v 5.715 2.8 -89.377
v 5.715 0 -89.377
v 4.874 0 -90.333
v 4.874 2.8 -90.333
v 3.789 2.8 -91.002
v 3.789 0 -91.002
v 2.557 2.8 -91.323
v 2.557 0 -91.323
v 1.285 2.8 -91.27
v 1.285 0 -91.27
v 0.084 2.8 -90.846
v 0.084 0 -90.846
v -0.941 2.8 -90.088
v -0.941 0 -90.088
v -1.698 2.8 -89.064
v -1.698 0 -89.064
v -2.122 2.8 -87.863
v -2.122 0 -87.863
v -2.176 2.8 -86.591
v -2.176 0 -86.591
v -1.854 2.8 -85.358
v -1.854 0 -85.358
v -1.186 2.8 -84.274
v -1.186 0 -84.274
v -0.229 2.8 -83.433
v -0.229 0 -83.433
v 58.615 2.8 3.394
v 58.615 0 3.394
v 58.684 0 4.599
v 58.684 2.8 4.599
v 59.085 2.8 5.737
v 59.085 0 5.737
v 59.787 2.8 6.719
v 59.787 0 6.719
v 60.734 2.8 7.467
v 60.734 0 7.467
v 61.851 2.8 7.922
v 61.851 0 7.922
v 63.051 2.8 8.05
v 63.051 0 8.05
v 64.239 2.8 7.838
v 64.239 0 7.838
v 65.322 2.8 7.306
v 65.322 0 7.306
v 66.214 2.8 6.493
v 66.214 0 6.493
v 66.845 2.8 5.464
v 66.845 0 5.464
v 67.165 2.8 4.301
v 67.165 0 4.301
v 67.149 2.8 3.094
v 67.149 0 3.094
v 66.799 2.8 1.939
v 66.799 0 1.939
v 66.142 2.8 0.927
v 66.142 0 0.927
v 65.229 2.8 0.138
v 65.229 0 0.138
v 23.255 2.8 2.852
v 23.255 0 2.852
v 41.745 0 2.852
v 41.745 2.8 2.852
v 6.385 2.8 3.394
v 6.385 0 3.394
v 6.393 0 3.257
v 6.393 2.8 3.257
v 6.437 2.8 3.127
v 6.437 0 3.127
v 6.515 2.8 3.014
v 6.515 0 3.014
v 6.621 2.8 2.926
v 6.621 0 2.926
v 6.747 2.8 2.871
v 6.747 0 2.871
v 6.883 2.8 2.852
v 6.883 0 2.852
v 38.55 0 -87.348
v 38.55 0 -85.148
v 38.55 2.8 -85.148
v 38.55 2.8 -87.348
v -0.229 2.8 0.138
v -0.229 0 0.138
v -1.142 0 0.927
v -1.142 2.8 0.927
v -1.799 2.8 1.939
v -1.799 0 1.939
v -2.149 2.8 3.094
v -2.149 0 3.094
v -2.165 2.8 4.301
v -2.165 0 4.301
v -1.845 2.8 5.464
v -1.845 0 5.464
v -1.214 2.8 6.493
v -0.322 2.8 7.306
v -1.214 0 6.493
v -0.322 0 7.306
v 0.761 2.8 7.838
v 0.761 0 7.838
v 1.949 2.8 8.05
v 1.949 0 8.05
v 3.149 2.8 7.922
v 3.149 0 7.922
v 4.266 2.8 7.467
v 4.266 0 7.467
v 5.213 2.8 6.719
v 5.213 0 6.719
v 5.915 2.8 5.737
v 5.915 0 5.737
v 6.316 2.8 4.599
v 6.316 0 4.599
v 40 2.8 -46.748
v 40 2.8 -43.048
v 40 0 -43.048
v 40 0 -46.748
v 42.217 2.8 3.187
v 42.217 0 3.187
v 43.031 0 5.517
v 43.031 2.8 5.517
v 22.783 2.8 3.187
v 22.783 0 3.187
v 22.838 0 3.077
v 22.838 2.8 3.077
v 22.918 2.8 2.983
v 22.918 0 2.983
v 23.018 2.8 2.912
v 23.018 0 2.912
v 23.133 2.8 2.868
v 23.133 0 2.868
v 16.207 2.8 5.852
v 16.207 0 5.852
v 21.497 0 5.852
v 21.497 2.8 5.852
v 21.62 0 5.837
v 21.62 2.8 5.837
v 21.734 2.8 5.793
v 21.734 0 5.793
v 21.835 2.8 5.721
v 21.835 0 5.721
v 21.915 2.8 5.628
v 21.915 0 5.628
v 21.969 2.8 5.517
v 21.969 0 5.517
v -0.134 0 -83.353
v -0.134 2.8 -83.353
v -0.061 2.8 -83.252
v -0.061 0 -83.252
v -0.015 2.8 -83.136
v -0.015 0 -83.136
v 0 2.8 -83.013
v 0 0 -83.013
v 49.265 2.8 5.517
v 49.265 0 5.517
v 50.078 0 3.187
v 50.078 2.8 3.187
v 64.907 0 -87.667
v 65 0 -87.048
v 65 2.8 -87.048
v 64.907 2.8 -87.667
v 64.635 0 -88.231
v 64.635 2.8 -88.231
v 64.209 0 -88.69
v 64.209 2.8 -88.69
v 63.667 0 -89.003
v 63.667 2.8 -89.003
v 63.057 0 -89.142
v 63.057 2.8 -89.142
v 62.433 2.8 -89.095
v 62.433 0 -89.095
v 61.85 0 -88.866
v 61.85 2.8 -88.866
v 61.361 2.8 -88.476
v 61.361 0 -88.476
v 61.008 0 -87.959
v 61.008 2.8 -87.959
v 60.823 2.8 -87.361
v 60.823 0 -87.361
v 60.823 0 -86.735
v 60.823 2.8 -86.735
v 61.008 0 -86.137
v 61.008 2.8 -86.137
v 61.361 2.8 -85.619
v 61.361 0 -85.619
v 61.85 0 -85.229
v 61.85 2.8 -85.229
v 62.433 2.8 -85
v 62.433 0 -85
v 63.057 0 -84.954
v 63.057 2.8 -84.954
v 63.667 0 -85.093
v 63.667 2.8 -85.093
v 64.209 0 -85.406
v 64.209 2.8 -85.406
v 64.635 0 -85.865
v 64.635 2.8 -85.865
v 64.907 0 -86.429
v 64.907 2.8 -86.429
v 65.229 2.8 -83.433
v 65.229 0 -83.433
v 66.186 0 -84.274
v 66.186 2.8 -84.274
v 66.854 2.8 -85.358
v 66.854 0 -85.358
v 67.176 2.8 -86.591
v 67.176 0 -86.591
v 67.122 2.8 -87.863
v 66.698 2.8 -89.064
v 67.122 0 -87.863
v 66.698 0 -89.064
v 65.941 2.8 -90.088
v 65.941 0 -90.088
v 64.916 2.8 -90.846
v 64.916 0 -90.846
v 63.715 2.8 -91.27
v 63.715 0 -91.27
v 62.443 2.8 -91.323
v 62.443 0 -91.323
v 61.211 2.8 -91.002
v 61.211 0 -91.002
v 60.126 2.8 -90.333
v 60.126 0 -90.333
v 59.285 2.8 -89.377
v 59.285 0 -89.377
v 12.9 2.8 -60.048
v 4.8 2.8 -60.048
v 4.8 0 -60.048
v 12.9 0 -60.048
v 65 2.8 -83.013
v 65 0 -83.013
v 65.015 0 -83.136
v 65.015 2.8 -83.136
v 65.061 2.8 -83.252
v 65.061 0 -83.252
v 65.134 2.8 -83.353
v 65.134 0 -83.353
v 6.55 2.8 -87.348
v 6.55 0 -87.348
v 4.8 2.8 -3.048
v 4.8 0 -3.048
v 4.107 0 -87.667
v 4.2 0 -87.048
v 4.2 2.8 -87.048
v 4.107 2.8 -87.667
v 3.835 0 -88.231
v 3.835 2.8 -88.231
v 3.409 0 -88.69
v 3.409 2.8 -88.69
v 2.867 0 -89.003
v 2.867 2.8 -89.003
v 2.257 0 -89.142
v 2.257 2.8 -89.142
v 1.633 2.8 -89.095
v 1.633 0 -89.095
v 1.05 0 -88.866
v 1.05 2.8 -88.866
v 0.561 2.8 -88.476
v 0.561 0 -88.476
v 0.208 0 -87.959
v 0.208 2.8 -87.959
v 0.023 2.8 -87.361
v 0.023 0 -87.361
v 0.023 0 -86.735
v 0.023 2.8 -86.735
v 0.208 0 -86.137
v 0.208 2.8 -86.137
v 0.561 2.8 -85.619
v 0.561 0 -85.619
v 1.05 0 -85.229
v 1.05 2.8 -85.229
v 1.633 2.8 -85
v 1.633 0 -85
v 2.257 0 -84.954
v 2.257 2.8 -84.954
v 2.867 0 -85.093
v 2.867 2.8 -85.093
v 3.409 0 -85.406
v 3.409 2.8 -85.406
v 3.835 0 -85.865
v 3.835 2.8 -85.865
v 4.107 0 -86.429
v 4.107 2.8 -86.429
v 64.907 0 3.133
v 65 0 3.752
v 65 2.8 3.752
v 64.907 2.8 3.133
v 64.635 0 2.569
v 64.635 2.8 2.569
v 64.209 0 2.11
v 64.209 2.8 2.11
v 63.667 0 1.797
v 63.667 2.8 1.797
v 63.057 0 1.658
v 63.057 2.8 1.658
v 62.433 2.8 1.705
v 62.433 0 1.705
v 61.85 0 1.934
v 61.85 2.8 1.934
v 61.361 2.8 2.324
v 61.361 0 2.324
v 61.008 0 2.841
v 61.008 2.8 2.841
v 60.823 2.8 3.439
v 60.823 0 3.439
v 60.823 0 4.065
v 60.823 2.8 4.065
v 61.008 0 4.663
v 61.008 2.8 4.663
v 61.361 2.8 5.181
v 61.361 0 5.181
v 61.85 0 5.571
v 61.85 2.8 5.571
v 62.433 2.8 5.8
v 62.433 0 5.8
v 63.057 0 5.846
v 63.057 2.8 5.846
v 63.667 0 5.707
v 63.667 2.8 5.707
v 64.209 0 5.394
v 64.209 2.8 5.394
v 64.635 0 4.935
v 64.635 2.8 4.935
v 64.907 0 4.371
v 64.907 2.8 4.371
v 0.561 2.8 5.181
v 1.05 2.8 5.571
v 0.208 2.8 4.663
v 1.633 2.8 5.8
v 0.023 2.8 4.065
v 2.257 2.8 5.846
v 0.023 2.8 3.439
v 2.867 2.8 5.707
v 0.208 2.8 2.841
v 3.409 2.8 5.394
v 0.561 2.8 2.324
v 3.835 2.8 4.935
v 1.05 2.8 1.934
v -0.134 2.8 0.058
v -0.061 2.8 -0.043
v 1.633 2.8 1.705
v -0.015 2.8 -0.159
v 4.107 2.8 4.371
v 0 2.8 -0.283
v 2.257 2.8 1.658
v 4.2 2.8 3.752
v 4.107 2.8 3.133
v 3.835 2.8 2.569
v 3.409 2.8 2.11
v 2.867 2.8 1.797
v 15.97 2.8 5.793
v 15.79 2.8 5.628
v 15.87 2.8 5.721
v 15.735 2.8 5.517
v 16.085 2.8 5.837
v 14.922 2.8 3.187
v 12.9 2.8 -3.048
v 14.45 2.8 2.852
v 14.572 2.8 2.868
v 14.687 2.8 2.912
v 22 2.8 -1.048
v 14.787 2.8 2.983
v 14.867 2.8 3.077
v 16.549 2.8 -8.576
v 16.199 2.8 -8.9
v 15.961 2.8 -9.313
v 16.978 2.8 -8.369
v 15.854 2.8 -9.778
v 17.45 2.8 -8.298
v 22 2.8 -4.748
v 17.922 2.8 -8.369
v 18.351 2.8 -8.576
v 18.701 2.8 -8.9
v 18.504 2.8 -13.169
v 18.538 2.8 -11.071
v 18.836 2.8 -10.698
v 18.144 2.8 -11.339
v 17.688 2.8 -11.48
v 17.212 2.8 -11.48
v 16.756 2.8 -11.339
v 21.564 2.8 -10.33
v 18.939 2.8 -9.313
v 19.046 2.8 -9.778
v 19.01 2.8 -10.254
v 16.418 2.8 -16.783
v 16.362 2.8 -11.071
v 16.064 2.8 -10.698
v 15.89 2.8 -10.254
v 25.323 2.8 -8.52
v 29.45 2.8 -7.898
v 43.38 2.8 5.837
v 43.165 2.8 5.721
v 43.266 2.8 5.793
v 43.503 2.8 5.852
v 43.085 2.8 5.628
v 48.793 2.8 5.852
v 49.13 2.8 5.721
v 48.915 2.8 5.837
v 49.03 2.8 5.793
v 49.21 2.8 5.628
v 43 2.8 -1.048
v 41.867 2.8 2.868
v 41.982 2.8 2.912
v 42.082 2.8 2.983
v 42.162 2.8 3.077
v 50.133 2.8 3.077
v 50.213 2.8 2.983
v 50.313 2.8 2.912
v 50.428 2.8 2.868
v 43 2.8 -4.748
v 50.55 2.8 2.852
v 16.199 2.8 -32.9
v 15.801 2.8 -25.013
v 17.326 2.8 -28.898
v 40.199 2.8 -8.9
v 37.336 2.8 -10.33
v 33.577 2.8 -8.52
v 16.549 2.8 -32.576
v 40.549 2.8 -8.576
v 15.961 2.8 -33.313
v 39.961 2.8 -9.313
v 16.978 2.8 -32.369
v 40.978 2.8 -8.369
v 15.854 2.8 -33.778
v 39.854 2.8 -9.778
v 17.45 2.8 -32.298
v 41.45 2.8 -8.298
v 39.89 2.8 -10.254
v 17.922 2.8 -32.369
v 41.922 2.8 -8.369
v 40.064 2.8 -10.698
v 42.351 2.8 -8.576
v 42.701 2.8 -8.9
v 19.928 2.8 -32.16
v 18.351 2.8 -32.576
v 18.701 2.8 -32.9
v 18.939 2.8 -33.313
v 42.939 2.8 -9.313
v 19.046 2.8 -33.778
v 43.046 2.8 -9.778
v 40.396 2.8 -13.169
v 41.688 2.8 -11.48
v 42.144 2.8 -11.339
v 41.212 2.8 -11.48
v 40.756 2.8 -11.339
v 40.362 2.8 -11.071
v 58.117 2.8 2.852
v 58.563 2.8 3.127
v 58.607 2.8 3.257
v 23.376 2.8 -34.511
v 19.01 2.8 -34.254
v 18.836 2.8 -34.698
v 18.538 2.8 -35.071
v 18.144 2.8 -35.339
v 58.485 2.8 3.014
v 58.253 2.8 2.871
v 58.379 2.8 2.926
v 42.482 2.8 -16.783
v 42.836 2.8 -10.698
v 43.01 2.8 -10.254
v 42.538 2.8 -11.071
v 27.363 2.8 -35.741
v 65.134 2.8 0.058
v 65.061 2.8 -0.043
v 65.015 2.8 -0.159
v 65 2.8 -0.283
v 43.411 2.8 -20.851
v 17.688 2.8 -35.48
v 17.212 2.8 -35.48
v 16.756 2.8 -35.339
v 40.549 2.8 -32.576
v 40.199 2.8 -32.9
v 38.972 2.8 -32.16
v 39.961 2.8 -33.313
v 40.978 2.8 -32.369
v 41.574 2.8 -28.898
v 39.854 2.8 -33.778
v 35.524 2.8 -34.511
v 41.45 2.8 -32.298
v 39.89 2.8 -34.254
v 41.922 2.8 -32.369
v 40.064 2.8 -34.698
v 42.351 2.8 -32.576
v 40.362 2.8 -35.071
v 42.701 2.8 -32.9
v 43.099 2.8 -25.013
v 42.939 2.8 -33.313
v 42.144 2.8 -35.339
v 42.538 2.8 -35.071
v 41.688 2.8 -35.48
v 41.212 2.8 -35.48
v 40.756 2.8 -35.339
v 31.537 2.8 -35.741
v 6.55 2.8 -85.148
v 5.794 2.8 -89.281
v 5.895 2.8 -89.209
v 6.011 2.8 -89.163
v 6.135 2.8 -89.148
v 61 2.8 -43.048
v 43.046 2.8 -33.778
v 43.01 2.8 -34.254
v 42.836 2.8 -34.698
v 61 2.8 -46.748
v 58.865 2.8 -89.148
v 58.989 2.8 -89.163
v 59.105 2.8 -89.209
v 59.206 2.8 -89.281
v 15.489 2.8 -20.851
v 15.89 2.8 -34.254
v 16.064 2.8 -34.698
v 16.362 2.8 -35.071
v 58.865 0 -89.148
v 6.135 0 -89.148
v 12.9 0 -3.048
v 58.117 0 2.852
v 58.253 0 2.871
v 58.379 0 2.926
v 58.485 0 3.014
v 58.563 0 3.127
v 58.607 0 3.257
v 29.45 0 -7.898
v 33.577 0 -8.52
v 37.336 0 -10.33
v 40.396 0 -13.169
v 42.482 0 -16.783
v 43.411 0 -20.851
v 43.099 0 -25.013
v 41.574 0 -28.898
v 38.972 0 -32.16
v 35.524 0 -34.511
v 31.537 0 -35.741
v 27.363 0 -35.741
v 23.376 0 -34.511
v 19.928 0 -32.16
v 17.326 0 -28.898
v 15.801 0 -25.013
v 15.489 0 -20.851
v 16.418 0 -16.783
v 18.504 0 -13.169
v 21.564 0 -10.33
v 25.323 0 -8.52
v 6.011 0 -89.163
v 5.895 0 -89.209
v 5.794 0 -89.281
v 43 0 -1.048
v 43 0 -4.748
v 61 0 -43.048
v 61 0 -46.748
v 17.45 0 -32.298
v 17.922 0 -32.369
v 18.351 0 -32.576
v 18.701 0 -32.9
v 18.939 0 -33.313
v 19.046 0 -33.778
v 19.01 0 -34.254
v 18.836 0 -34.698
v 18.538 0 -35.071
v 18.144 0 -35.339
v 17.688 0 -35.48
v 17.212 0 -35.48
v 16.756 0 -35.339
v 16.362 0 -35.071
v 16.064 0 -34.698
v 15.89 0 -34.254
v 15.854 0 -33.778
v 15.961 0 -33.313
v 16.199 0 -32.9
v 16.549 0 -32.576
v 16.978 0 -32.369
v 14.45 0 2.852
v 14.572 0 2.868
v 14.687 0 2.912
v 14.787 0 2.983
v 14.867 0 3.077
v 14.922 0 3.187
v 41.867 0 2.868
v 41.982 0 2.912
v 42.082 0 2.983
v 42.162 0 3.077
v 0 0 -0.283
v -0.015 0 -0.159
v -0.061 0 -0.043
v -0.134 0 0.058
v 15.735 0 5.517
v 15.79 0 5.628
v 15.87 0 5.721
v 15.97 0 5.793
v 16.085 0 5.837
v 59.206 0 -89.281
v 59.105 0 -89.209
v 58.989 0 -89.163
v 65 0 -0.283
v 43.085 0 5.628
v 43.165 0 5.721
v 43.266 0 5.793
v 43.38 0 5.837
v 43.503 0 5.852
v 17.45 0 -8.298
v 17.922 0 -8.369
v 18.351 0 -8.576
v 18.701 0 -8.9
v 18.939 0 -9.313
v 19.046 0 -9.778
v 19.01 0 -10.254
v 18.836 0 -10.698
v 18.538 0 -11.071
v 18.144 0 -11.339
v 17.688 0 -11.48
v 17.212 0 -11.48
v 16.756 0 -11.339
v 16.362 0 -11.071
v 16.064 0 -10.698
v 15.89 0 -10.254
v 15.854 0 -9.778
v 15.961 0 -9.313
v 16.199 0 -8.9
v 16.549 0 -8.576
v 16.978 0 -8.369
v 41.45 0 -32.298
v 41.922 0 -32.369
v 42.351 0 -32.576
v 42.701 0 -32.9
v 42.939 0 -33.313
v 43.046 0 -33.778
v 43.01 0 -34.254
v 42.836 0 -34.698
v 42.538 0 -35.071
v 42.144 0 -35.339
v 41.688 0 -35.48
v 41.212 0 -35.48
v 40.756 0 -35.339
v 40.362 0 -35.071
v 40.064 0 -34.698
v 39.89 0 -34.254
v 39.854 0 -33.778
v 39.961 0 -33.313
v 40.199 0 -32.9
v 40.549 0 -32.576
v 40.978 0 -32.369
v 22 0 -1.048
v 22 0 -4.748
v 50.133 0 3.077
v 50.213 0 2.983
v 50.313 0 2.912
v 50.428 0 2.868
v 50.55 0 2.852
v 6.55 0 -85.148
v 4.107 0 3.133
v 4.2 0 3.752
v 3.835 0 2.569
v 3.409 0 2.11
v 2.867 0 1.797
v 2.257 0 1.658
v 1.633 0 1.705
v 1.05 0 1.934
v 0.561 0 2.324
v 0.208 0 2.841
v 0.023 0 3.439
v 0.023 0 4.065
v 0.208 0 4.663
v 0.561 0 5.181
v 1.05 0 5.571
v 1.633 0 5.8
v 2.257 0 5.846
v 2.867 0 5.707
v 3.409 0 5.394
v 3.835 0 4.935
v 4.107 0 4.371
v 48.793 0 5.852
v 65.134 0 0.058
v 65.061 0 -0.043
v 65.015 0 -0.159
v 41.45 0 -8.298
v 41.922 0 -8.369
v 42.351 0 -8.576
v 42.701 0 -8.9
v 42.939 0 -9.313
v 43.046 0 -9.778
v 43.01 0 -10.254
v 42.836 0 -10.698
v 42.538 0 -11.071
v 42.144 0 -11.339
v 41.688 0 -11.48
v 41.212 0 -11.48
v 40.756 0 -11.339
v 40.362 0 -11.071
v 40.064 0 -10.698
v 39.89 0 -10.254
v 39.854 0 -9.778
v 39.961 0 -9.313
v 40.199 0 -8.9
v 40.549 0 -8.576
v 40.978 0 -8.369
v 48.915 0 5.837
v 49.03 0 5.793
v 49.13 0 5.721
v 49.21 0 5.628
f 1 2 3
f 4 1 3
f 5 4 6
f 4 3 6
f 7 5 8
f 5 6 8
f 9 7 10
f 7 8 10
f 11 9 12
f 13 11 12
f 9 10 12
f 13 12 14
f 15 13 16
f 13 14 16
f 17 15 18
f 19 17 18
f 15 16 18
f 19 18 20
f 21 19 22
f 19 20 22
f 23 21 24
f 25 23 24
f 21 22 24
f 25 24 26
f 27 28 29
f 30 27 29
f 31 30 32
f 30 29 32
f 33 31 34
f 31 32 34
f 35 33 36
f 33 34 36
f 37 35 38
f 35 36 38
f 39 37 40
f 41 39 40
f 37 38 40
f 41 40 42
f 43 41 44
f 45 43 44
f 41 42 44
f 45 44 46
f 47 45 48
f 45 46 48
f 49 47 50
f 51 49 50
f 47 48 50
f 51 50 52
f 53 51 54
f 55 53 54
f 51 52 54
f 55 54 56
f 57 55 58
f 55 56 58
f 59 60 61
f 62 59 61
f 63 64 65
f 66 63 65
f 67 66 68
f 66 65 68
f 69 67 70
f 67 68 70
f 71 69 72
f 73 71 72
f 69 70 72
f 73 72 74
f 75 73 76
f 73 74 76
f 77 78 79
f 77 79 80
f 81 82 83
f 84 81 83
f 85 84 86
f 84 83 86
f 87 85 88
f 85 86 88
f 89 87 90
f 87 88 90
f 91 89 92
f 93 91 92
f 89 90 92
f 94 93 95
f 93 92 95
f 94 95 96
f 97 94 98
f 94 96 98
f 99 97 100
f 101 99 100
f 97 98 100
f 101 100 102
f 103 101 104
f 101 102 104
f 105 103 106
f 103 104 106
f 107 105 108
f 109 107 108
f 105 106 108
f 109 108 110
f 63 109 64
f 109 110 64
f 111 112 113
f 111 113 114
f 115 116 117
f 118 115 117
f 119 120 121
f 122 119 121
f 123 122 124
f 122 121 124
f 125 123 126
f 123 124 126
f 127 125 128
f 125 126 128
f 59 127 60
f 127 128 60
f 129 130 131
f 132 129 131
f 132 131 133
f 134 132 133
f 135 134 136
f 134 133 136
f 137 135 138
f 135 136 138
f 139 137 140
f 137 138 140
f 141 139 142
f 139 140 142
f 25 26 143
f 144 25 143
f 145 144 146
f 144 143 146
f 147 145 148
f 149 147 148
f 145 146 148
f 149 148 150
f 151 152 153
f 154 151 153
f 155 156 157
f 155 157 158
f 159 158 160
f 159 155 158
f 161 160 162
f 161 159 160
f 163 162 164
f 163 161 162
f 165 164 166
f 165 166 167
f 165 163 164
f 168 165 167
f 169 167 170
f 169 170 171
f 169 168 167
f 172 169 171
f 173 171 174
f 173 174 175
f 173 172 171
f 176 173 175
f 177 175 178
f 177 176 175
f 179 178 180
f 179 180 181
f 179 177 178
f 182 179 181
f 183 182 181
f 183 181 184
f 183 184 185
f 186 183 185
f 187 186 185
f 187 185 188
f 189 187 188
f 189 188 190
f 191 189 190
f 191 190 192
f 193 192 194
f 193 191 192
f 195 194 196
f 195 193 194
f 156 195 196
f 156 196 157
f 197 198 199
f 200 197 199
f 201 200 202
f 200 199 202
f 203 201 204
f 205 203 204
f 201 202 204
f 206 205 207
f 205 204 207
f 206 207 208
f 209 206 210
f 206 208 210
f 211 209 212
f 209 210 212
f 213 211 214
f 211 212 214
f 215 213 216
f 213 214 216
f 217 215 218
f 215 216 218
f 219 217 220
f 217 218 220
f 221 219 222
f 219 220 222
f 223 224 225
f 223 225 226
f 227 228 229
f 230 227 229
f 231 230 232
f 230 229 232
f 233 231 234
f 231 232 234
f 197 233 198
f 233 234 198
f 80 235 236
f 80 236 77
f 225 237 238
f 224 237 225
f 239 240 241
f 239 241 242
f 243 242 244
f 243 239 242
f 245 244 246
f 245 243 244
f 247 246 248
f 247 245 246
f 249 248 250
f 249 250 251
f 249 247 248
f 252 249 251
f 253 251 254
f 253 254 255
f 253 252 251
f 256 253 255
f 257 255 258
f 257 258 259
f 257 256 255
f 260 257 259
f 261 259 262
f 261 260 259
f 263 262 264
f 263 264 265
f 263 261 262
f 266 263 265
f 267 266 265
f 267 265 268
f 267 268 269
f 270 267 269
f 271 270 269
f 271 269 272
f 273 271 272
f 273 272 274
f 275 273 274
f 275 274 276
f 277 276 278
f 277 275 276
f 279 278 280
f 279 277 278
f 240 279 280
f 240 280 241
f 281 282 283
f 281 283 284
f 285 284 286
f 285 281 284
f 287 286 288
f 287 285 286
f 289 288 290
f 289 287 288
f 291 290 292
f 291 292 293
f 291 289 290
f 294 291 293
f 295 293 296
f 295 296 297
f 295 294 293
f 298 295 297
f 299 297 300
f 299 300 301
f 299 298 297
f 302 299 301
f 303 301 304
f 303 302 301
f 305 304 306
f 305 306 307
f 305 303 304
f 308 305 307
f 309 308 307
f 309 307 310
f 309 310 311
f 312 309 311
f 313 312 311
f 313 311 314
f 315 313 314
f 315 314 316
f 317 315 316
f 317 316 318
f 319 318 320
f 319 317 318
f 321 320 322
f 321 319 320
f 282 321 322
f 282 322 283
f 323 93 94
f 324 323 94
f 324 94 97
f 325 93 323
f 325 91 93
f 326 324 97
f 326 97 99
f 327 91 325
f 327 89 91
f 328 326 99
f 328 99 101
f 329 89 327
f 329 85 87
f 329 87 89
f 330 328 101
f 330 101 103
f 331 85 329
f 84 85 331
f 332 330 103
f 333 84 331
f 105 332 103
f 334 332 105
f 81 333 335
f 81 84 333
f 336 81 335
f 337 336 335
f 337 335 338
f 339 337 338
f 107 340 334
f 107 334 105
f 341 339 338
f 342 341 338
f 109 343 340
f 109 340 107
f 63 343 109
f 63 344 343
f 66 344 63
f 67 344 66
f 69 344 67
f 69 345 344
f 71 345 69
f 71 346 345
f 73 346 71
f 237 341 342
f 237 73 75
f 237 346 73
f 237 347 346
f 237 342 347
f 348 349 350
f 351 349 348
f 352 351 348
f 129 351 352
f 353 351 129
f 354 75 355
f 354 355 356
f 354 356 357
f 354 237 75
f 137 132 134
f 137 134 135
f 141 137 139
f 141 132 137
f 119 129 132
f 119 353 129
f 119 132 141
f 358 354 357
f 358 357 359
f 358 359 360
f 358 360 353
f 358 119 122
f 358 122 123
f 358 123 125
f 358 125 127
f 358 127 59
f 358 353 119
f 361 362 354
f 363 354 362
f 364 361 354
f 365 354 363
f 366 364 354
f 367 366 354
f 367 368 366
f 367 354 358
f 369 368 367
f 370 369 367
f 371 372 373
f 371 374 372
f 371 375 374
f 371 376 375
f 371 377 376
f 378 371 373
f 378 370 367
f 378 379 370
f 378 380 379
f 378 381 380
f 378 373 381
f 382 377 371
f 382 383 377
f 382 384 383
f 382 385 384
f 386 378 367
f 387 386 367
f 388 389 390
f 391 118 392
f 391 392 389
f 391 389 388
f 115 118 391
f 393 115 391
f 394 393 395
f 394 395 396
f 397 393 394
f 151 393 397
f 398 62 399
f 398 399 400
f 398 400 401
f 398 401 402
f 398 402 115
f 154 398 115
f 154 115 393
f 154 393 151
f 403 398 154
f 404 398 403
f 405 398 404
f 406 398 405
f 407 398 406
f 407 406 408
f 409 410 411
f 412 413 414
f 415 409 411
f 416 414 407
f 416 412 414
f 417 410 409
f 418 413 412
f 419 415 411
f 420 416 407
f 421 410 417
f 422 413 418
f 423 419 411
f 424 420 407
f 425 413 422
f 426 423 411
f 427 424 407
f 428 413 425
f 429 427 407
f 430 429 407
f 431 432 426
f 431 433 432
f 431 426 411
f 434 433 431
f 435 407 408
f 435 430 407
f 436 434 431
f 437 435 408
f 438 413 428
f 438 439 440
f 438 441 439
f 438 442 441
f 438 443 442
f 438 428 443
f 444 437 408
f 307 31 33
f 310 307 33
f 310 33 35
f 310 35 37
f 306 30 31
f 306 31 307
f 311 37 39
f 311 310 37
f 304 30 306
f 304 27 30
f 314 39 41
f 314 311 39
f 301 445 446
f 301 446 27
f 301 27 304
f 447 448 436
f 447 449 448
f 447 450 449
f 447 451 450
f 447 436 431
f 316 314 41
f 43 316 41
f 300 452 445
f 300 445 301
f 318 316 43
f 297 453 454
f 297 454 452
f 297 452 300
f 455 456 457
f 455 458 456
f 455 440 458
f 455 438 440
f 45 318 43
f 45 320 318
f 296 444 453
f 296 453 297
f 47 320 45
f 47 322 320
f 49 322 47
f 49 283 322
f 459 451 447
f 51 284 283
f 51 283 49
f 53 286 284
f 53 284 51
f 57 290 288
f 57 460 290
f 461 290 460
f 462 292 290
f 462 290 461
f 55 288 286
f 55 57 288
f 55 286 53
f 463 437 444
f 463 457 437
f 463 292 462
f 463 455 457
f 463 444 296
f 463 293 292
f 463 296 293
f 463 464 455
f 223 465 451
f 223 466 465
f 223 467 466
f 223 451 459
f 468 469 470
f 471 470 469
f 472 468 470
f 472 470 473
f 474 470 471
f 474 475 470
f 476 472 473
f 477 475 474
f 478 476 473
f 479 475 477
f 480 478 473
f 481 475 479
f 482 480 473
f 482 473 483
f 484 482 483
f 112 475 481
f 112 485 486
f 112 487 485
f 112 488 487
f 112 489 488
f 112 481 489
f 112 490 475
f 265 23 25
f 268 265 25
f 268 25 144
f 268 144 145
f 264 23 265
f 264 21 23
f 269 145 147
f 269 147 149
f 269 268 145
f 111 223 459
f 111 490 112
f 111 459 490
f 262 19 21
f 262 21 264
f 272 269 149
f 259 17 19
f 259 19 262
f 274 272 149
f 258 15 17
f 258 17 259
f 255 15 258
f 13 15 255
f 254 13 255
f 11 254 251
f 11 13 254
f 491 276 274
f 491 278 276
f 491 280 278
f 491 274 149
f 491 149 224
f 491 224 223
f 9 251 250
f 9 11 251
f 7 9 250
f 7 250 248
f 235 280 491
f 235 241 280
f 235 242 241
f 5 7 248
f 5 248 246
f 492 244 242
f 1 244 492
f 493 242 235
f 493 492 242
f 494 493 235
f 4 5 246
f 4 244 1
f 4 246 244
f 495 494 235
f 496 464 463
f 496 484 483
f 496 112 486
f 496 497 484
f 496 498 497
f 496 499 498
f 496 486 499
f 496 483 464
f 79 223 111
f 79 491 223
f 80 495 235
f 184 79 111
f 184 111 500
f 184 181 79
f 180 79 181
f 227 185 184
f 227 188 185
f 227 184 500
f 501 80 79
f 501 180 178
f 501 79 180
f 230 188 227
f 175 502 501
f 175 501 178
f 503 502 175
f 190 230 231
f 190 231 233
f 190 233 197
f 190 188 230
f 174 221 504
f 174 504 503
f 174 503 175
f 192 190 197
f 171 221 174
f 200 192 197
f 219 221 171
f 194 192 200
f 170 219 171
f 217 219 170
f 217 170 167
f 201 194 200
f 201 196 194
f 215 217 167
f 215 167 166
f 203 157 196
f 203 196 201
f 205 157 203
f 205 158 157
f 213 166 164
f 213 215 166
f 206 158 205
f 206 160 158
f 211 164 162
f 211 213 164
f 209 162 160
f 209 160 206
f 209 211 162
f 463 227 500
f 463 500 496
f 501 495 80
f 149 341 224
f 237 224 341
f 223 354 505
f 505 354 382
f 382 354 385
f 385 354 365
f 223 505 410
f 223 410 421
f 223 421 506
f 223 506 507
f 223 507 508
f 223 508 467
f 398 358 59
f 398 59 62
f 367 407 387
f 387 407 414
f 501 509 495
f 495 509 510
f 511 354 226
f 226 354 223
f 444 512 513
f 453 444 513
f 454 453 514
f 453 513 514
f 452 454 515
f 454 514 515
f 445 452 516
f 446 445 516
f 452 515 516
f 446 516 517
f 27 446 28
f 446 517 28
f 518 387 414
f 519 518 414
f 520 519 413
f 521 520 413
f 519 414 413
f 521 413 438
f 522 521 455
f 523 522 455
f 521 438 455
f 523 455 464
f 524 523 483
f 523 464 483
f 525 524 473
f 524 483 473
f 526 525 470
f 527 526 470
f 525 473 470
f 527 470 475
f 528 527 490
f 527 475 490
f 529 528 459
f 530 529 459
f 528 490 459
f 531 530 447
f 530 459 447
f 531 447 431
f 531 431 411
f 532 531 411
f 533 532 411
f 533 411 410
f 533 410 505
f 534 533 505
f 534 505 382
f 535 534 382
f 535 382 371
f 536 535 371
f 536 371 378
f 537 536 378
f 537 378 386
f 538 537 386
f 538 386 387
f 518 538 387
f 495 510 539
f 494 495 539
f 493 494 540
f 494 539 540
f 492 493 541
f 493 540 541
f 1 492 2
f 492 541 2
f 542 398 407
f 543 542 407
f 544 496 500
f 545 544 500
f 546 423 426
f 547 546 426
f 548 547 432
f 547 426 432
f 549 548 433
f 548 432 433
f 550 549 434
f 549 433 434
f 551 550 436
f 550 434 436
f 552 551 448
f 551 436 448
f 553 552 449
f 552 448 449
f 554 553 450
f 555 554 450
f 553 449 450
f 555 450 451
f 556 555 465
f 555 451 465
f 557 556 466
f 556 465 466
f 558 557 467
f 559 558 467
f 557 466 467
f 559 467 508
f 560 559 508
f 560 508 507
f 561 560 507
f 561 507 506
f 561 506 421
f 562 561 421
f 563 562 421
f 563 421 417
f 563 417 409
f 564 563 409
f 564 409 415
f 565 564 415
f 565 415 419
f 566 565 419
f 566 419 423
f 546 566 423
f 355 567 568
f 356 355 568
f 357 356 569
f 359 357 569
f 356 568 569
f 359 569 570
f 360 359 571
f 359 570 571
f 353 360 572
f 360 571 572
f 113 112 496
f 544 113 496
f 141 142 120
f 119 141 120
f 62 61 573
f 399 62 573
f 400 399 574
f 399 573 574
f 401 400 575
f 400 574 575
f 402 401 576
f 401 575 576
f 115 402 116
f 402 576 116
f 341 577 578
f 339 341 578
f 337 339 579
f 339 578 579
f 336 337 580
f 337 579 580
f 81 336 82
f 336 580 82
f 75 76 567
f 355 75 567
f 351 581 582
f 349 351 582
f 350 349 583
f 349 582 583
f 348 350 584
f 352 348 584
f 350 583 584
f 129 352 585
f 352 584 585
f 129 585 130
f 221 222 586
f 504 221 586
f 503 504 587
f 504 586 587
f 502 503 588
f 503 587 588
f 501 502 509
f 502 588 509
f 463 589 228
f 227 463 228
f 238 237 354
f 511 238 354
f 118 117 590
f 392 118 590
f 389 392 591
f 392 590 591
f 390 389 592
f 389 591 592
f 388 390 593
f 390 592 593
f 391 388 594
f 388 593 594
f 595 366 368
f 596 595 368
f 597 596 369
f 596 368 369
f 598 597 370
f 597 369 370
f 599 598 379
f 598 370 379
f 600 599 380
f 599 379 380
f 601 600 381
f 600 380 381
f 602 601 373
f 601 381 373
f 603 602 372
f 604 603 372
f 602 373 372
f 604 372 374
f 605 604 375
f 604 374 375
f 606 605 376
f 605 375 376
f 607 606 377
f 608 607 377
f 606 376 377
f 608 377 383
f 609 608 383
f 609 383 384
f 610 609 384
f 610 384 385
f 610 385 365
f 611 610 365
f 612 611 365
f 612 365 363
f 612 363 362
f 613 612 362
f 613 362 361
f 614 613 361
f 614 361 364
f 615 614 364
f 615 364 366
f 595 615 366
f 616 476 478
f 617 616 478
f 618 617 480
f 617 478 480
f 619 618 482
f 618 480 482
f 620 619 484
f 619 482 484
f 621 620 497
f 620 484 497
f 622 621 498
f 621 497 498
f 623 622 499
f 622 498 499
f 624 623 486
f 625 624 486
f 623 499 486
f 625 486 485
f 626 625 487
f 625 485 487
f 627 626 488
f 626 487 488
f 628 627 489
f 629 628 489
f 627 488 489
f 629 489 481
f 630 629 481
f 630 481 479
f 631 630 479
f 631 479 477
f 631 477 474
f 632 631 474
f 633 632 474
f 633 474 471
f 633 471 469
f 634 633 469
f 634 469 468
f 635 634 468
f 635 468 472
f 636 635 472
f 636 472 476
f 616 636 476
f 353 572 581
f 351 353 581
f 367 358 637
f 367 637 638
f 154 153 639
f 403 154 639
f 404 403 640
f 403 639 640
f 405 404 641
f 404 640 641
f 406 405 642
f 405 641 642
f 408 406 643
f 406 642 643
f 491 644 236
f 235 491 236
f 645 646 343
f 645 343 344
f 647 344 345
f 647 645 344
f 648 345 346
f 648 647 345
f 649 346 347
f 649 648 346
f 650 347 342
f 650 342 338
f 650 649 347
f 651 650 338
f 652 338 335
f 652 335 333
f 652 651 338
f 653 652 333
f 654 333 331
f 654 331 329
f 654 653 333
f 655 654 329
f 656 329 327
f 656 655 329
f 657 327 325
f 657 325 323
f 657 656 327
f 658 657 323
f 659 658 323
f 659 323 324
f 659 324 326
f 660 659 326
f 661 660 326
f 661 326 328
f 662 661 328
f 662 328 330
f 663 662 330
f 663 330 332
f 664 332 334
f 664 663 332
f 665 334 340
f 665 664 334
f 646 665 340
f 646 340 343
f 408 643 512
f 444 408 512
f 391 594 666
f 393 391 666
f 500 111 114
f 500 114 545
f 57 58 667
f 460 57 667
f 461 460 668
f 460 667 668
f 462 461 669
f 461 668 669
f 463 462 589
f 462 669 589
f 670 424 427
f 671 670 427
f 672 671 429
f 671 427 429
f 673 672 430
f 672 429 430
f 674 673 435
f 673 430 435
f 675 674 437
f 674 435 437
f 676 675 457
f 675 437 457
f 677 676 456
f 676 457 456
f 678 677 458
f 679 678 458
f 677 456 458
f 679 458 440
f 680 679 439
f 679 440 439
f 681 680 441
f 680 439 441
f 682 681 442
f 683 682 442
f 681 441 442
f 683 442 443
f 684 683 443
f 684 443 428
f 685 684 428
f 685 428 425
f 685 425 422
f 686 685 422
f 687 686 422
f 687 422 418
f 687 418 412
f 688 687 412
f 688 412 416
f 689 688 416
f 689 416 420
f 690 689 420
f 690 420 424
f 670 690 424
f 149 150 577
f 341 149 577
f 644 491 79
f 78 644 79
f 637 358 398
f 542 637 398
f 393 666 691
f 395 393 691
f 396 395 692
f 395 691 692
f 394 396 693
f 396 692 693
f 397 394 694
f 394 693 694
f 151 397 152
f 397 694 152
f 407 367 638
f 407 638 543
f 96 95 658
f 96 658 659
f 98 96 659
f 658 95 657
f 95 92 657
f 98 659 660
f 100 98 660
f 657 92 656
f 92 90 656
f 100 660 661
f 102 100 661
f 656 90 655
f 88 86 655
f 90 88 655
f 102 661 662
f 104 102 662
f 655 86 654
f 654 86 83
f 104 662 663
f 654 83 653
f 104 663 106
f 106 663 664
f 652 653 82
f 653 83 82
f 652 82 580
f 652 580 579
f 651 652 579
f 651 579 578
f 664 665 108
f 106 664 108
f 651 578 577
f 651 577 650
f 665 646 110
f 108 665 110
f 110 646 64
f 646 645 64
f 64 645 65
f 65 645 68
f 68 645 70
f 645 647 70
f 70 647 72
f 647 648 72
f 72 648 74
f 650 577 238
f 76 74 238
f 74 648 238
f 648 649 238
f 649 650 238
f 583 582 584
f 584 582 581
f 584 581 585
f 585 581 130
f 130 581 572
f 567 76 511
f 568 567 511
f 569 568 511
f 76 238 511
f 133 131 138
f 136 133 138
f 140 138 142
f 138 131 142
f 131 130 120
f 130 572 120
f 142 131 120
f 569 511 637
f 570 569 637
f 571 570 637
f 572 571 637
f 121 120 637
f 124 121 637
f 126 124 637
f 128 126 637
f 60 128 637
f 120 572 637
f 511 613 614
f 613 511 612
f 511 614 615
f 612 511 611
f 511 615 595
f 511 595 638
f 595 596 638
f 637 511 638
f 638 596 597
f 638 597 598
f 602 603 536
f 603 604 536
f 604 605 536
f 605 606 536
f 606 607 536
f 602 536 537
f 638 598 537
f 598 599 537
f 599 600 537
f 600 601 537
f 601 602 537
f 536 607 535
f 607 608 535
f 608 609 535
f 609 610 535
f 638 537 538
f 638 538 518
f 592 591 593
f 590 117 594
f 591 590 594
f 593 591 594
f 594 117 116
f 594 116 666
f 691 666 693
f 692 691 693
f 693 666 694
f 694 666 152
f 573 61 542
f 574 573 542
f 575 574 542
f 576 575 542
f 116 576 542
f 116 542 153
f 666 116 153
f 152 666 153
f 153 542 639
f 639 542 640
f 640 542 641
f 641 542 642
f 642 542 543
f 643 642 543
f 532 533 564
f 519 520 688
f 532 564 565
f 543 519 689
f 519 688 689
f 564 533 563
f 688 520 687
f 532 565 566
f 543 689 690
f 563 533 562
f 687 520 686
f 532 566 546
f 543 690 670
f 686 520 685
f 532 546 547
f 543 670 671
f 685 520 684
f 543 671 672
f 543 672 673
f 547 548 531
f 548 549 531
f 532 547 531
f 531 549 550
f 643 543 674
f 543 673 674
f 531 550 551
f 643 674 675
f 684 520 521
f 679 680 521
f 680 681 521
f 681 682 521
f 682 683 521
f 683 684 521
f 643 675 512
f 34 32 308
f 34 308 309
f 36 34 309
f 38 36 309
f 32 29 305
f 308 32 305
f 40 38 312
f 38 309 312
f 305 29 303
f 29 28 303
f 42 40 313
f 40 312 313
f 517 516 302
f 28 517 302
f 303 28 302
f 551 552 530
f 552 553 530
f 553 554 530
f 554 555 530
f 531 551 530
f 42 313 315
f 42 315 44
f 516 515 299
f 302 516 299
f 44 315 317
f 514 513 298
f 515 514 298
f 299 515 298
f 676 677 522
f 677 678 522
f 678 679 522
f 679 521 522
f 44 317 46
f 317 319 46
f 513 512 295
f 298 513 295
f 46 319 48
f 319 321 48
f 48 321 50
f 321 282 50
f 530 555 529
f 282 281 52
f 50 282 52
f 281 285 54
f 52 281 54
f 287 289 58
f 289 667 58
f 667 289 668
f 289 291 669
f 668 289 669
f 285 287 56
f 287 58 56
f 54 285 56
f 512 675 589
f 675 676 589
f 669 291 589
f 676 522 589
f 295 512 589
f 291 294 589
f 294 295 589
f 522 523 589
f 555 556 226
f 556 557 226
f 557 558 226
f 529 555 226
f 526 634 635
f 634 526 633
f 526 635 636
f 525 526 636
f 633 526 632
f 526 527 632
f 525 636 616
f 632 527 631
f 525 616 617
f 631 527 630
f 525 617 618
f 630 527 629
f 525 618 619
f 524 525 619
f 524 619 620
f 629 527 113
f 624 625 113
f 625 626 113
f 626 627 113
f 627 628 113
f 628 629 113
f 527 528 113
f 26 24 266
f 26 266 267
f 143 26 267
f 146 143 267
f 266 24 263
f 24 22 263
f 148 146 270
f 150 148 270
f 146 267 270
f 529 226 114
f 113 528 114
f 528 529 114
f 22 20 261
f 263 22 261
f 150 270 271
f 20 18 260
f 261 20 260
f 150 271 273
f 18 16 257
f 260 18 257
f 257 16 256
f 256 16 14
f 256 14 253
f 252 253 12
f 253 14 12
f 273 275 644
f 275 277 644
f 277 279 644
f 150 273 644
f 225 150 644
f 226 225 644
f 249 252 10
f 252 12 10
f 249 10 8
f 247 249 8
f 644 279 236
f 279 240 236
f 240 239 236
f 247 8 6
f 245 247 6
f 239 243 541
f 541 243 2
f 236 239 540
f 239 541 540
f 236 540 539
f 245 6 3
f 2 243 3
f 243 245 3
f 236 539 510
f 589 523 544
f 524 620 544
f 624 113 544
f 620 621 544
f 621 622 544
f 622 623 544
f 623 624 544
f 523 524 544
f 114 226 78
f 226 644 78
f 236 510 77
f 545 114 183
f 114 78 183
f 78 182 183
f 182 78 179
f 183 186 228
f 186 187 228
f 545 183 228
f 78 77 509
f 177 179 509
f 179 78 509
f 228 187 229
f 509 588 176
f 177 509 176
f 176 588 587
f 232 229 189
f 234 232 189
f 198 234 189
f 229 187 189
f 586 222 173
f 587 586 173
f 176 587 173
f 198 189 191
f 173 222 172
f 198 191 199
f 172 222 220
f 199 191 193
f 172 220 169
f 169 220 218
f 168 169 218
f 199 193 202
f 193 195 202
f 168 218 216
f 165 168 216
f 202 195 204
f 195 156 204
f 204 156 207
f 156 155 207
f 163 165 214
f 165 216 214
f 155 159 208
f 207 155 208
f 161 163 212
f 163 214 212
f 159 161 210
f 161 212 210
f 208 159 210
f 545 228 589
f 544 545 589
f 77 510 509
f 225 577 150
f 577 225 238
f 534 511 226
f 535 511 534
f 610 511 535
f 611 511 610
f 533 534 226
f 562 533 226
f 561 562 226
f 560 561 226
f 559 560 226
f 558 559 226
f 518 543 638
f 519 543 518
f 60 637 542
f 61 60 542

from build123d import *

# Parameters (mm, degrees)
BASEPLATE_OUTLINE_R = 2.1
BASEPLATE_DEPTH     = 2.8
CUT_EXTRUDE1_REACH  = 115.438
SKETCH3_R           = 14
SKETCH3_R_2         = 1.6
SKETCH3_W           = 21
SKETCH3_H           = 3.7
SKETCH3_W_2         = 32
SKETCH3_H_2         = 2.2
SKETCH3_W_3         = 8.1
SKETCH3_H_3         = 57


# Read off the part's stored shape, not the designer's step: BasePlate
with BuildPart() as part:
    # BasePlate outline → BasePlate (new body)
    with BuildSketch(Plane(origin=(0, 0, 0), x_dir=(1, 0, 0), z_dir=(0, 1, 0))):
        with BuildLine():
            Line((43.502626614, -5.852332608), (48.792614178, -5.852332608))
            ThreePointArc((48.792614178, -5.852332608), (49.082078508, -5.760021707), (49.264659986, -5.517174213))
            Line((49.264659986, -5.517174213), (50.078201202, -3.187491002))
            ThreePointArc((50.078201202, -3.187491002), (50.26078268, -2.944643509), (50.55024701, -2.852332608))
            Line((50.55024701, -2.852332608), (58.116695703, -2.852332608))
            ThreePointArc((58.116695703, -2.852332608), (58.484685739, -3.013831008), (58.614956567, -3.393999275))
            ThreePointArc((58.614956567, -3.393999275), (64.799237397, -7.61016844), (65.229166667, -0.137781095))
            ThreePointArc((65.229166667, -0.137781095), (65.061014427, 0.043158816), (65, 0.282515593))
            Line((65, 0.282515593), (65, 83.012819192))
            ThreePointArc((65, 83.012819192), (65.061014427, 83.252175969), (65.229166667, 83.433115879))
            ThreePointArc((65.229166667, 83.433115879), (65.940559159, 90.088226551), (59.285448487, 89.376834059))
            ThreePointArc((59.285448487, 89.376834059), (59.104508577, 89.208681819), (58.8651518, 89.147667392))
            Line((58.8651518, 89.147667392), (6.1348482, 89.147667392))
            ThreePointArc((6.1348482, 89.147667392), (5.895491423, 89.208681819), (5.714551513, 89.376834059))
            ThreePointArc((5.714551513, 89.376834059), (-0.940559159, 90.088226551), (-0.229166667, 83.433115879))
            ThreePointArc((-0.229166667, 83.433115879), (-0.061014427, 83.252175969), (0, 83.012819192))
            Line((0, 83.012819192), (0, 0.282515593))
            ThreePointArc((0, 0.282515593), (-0.061014427, 0.043158816), (-0.229166667, -0.137781095))
            ThreePointArc((-0.229166667, -0.137781095), (0.200762603, -7.61016844), (6.385043433, -3.393999275))
            ThreePointArc((6.385043433, -3.393999275), (6.515314261, -3.013831008), (6.883304297, -2.852332608))
            Line((6.883304297, -2.852332608), (14.44975299, -2.852332608))
            ThreePointArc((14.44975299, -2.852332608), (14.73921732, -2.944643509), (14.921798798, -3.187491002))
            Line((14.921798798, -3.187491002), (15.735340014, -5.517174213))
            ThreePointArc((15.735340014, -5.517174213), (15.917921492, -5.760021707), (16.207385822, -5.852332608))
            Line((16.207385822, -5.852332608), (21.497373386, -5.852332608))
            ThreePointArc((21.497373386, -5.852332608), (21.786837716, -5.760021707), (21.969419194, -5.517174213))
            Line((21.969419194, -5.517174213), (22.78296041, -3.187491002))
            ThreePointArc((22.78296041, -3.187491002), (22.965541888, -2.944643509), (23.255006218, -2.852332608))
            Line((23.255006218, -2.852332608), (41.744993782, -2.852332608))
            ThreePointArc((41.744993782, -2.852332608), (42.034458112, -2.944643509), (42.21703959, -3.187491002))
            Line((42.21703959, -3.187491002), (43.030580806, -5.517174213))
            ThreePointArc((43.030580806, -5.517174213), (43.213162284, -5.760021707), (43.502626614, -5.852332608))
        make_face()
        with Locations((2.1, -3.752332608)):
            Circle(BASEPLATE_OUTLINE_R, mode=Mode.SUBTRACT)
        with Locations((62.9, -3.752332608)):
            Circle(BASEPLATE_OUTLINE_R, mode=Mode.SUBTRACT)
        with Locations((2.1, 87.047667392)):
            Circle(BASEPLATE_OUTLINE_R, mode=Mode.SUBTRACT)
        with Locations((62.9, 87.047667392)):
            Circle(BASEPLATE_OUTLINE_R, mode=Mode.SUBTRACT)
    extrude(amount=BASEPLATE_DEPTH)

    # Sketch3 → Cut-Extrude1 (cut, up to next)
    with BuildSketch(Plane(origin=(0, 2.8, 0), x_dir=(1, 0, 0), z_dir=(0, 1, 0)), mode=Mode.PRIVATE) as cut_extrude1_sk1:
        with Locations(Location((29.45, 21.897667392, 0), (0, 0, 270))):
            Circle(SKETCH3_R)
    cut_extrude1_tool1 = extrude(cut_extrude1_sk1.sketch, amount=-CUT_EXTRUDE1_REACH, mode=Mode.PRIVATE) & part.part
    # Sketch3 → Cut-Extrude1 (cut, up to next)
    with BuildSketch(Plane(origin=(0, 2.8, 0), x_dir=(1, 0, 0), z_dir=(0, 1, 0)), mode=Mode.PRIVATE) as cut_extrude1_sk2:
        with Locations(Location((41.45, 33.897667392, 0), (0, 0, 270))):
            Circle(SKETCH3_R_2)
    cut_extrude1_tool2 = extrude(cut_extrude1_sk2.sketch, amount=-CUT_EXTRUDE1_REACH, mode=Mode.PRIVATE) & part.part
    # Sketch3 → Cut-Extrude1 (cut, up to next)
    with BuildSketch(Plane(origin=(0, 2.8, 0), x_dir=(1, 0, 0), z_dir=(0, 1, 0)), mode=Mode.PRIVATE) as cut_extrude1_sk3:
        with Locations(Location((41.45, 9.897667392, 0), (0, 0, 270))):
            Circle(SKETCH3_R_2)
    cut_extrude1_tool3 = extrude(cut_extrude1_sk3.sketch, amount=-CUT_EXTRUDE1_REACH, mode=Mode.PRIVATE) & part.part
    # Sketch3 → Cut-Extrude1 (cut, up to next)
    with BuildSketch(Plane(origin=(0, 2.8, 0), x_dir=(1, 0, 0), z_dir=(0, 1, 0)), mode=Mode.PRIVATE) as cut_extrude1_sk4:
        with Locations(Location((17.45, 9.897667392, 0), (0, 0, 270))):
            Circle(SKETCH3_R_2)
    cut_extrude1_tool4 = extrude(cut_extrude1_sk4.sketch, amount=-CUT_EXTRUDE1_REACH, mode=Mode.PRIVATE) & part.part
    # Sketch3 → Cut-Extrude1 (cut, up to next)
    with BuildSketch(Plane(origin=(0, 2.8, 0), x_dir=(1, 0, 0), z_dir=(0, 1, 0)), mode=Mode.PRIVATE) as cut_extrude1_sk5:
        with Locations(Location((17.45, 33.897667392, 0), (0, 0, 270))):
            Circle(SKETCH3_R_2)
    cut_extrude1_tool5 = extrude(cut_extrude1_sk5.sketch, amount=-CUT_EXTRUDE1_REACH, mode=Mode.PRIVATE) & part.part
    # Sketch3 → Cut-Extrude1 (cut, up to next)
    with BuildSketch(Plane(origin=(0, 2.8, 0), x_dir=(1, 0, 0), z_dir=(0, 1, 0)), mode=Mode.PRIVATE) as cut_extrude1_sk6:
        with Locations((32.5, 2.897667392)):
            Rectangle(SKETCH3_W, SKETCH3_H)
    cut_extrude1_tool6 = extrude(cut_extrude1_sk6.sketch, amount=-CUT_EXTRUDE1_REACH, mode=Mode.PRIVATE) & part.part
    # Sketch3 → Cut-Extrude1 (cut, up to next)
    with BuildSketch(Plane(origin=(0, 2.8, 0), x_dir=(1, 0, 0), z_dir=(0, 1, 0)), mode=Mode.PRIVATE) as cut_extrude1_sk7:
        with Locations((50.5, 44.897667392)):
            Rectangle(SKETCH3_W, SKETCH3_H)
    cut_extrude1_tool7 = extrude(cut_extrude1_sk7.sketch, amount=-CUT_EXTRUDE1_REACH, mode=Mode.PRIVATE) & part.part
    # Sketch3 → Cut-Extrude1 (cut, up to next)
    with BuildSketch(Plane(origin=(0, 2.8, 0), x_dir=(1, 0, 0), z_dir=(0, 1, 0)), mode=Mode.PRIVATE) as cut_extrude1_sk8:
        with Locations((22.55, 86.247667392)):
            Rectangle(SKETCH3_W_2, SKETCH3_H_2)
    cut_extrude1_tool8 = extrude(cut_extrude1_sk8.sketch, amount=-CUT_EXTRUDE1_REACH, mode=Mode.PRIVATE) & part.part
    # Sketch3 → Cut-Extrude1 (cut, up to next)
    with BuildSketch(Plane(origin=(0, 2.8, 0), x_dir=(1, 0, 0), z_dir=(0, 1, 0)), mode=Mode.PRIVATE) as cut_extrude1_sk9:
        with Locations((8.85, 31.547667392)):
            Rectangle(SKETCH3_W_3, SKETCH3_H_3)
    cut_extrude1_tool9 = extrude(cut_extrude1_sk9.sketch, amount=-CUT_EXTRUDE1_REACH, mode=Mode.PRIVATE) & part.part
    add(cut_extrude1_tool1.solids().sort_by_distance((29.45, 2.8, -21.897667))[0], mode=Mode.SUBTRACT)
    add(cut_extrude1_tool2.solids().sort_by_distance((41.45, 2.8, -33.897667))[0], mode=Mode.SUBTRACT)
    add(cut_extrude1_tool3.solids().sort_by_distance((41.45, 2.8, -9.897667))[0], mode=Mode.SUBTRACT)
    add(cut_extrude1_tool4.solids().sort_by_distance((17.45, 2.8, -9.897667))[0], mode=Mode.SUBTRACT)
    add(cut_extrude1_tool5.solids().sort_by_distance((17.45, 2.8, -33.897667))[0], mode=Mode.SUBTRACT)
    add(cut_extrude1_tool6.solids().sort_by_distance((32.5, 2.8, -2.897667))[0], mode=Mode.SUBTRACT)
    add(cut_extrude1_tool7.solids().sort_by_distance((50.5, 2.8, -44.897667))[0], mode=Mode.SUBTRACT)
    add(cut_extrude1_tool8.solids().sort_by_distance((22.55, 2.8, -86.247667))[0], mode=Mode.SUBTRACT)
    add(cut_extrude1_tool9.solids().sort_by_distance((8.85, 2.8, -31.547667))[0], mode=Mode.SUBTRACT)


solid = part.part
